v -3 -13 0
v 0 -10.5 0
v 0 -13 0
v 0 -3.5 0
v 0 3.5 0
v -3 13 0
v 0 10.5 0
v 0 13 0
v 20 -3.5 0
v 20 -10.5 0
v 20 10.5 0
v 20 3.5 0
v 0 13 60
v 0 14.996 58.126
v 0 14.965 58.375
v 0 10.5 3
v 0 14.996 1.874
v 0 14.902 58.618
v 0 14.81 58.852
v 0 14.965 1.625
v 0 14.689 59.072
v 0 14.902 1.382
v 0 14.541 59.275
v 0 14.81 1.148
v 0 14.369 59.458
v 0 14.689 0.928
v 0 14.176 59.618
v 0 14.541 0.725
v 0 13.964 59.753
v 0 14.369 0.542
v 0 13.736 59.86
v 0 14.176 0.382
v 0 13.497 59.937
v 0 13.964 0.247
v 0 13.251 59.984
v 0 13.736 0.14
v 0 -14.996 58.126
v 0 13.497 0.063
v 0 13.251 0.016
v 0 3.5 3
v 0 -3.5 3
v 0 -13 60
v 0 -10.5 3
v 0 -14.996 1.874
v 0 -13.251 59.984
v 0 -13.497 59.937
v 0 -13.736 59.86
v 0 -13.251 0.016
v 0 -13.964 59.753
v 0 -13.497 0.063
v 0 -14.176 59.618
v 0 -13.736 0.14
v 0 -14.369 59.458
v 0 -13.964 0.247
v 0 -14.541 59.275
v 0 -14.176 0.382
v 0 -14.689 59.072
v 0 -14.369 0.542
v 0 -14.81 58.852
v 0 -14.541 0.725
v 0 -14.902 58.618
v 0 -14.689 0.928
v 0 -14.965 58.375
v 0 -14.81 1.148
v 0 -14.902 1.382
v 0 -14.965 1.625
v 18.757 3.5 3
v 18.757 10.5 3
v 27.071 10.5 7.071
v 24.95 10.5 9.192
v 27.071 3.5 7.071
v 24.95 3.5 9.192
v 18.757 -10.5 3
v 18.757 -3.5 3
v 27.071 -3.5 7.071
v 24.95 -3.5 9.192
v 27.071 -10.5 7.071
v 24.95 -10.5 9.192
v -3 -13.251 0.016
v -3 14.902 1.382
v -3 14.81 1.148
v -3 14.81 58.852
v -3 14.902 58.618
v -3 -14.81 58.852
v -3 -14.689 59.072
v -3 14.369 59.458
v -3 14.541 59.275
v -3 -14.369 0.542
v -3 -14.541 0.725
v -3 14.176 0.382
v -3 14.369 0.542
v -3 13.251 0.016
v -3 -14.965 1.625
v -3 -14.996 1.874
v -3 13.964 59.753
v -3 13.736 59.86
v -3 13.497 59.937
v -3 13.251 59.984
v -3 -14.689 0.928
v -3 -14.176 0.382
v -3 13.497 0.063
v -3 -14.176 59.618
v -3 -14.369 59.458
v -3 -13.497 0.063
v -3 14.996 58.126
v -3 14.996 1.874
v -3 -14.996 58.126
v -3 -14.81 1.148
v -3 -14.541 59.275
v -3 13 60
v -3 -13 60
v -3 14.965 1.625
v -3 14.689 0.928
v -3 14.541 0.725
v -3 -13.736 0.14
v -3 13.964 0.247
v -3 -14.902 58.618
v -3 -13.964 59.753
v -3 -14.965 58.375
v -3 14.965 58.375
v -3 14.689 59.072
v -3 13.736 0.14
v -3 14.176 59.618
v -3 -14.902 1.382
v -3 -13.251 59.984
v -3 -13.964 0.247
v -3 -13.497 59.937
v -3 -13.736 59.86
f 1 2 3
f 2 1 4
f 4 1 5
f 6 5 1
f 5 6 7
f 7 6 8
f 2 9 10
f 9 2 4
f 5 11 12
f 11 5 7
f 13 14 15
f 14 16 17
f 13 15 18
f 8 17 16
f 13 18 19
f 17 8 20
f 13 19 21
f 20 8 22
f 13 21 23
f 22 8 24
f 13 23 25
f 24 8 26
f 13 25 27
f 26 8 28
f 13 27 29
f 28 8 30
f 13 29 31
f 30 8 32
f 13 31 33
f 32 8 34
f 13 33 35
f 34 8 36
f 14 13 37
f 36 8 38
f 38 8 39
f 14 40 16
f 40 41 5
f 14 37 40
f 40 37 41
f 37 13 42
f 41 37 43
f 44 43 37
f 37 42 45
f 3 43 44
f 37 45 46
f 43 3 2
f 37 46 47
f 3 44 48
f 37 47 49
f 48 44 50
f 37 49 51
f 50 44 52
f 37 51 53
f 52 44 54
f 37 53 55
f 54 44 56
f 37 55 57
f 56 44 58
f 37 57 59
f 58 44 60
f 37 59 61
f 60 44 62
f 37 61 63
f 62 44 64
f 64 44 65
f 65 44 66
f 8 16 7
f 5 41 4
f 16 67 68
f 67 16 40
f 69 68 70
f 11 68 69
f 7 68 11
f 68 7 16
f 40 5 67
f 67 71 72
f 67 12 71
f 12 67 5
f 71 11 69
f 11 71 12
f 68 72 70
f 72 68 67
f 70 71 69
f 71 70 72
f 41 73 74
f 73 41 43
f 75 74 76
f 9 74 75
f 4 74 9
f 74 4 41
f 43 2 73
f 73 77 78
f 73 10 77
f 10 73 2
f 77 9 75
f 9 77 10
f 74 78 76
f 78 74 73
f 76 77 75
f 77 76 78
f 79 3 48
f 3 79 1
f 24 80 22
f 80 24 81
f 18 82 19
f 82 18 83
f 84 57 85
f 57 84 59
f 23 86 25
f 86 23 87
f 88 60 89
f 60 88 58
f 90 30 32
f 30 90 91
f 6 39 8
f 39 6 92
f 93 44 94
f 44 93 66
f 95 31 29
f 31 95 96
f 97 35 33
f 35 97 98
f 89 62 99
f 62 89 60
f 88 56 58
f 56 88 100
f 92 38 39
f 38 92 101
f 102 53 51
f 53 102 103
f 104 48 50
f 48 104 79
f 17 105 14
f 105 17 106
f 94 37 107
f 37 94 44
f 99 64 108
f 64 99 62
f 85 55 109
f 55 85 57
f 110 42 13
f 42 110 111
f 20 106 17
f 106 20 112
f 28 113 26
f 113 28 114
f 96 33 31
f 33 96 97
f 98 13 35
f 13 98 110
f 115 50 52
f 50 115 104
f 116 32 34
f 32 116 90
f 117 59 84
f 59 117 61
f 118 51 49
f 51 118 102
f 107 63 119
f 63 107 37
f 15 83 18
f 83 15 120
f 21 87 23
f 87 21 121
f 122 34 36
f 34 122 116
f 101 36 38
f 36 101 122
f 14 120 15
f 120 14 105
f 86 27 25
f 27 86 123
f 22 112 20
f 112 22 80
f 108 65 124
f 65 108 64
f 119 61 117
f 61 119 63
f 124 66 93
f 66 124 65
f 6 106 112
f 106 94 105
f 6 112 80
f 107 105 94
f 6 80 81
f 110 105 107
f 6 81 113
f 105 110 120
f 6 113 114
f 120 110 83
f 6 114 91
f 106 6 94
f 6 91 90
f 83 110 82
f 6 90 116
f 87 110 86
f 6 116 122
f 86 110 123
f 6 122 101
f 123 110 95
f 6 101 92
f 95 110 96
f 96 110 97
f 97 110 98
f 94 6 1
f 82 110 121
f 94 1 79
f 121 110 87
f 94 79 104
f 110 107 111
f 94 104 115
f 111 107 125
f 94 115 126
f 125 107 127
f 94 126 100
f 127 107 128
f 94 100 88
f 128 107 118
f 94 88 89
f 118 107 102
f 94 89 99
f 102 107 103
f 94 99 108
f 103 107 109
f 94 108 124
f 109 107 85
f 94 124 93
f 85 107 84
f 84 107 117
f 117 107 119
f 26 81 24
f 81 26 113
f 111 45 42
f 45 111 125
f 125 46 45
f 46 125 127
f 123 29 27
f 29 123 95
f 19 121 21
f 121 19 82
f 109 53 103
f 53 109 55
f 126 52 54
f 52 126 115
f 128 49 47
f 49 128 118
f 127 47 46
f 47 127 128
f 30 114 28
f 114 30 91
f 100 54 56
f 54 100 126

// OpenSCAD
// file: ../utils/misc.scad
module rounded_rectangle(width, height, corner_radius, center = false) {

    x_offset = center ? -width/2 : 0;
    y_offset = center ? -height/2 : 0;

    corners_points = [
            [corner_radius, corner_radius],
            [width - corner_radius, corner_radius],
            [width - corner_radius, height - corner_radius],
            [corner_radius, height - corner_radius],
        ];

    hull() {
        for (p = corners_points) {
            translate([p.x + x_offset, p.y + y_offset, -1])
                circle(corner_radius);
        }
    }
}


module circle_segment(radius, cut_off_height) {
    intersection() {
        translate([0, -cut_off_height]) {
            circle(radius);
        }
        translate([-radius, 0]) {
            square([radius * 2, cut_off_height * 2]);
        }
    }
}

module tear_drop_circle(d) {
    r = d / 2;
    angle = 30;
    offset_y = r / 2;
    offset_x = cos(angle) * r;

    triangle_points = [
            [-offset_x, r / 2],
            [offset_x, r / 2],
            [0, 3 / 2 * r]
        ];

    polygon(triangle_points);
    circle(d = d);

}
// main file
use <../utils/misc.scad>

$fn = 50;

wall_width = 30;
wall_height = 60;
wall_thickness = 3;
probe_neck_width = 7;
grip_width = 7;
grip_thickness = 3;
grip_length = 20;
grip_finger_angle = 45;
grip_finger_length = 10;

oscilloscope_probe_holder();

module oscilloscope_probe_holder() {
    // left grip
    translate([0, probe_neck_width/2]) {
        grip();
    }

    // right grip
    translate([0, -probe_neck_width/2*3]) {
        grip();
    }

    // wall
    translate([0, -wall_width/2]) {
        rotate(270, [0, 1, 0]) {
            linear_extrude(wall_thickness) {
                rounded_rectangle(wall_height, wall_width, 2);
            }
        }
    }
}

module grip() {
    linear_extrude(grip_thickness) {
        square([grip_length, grip_width]);
    }

    translate([grip_length, 0]) {
        rotate(-grip_finger_angle, [0, 1, 0]) {
            linear_extrude(grip_thickness) {
                square([grip_finger_length, grip_width]);
            }
        }
    }
}
